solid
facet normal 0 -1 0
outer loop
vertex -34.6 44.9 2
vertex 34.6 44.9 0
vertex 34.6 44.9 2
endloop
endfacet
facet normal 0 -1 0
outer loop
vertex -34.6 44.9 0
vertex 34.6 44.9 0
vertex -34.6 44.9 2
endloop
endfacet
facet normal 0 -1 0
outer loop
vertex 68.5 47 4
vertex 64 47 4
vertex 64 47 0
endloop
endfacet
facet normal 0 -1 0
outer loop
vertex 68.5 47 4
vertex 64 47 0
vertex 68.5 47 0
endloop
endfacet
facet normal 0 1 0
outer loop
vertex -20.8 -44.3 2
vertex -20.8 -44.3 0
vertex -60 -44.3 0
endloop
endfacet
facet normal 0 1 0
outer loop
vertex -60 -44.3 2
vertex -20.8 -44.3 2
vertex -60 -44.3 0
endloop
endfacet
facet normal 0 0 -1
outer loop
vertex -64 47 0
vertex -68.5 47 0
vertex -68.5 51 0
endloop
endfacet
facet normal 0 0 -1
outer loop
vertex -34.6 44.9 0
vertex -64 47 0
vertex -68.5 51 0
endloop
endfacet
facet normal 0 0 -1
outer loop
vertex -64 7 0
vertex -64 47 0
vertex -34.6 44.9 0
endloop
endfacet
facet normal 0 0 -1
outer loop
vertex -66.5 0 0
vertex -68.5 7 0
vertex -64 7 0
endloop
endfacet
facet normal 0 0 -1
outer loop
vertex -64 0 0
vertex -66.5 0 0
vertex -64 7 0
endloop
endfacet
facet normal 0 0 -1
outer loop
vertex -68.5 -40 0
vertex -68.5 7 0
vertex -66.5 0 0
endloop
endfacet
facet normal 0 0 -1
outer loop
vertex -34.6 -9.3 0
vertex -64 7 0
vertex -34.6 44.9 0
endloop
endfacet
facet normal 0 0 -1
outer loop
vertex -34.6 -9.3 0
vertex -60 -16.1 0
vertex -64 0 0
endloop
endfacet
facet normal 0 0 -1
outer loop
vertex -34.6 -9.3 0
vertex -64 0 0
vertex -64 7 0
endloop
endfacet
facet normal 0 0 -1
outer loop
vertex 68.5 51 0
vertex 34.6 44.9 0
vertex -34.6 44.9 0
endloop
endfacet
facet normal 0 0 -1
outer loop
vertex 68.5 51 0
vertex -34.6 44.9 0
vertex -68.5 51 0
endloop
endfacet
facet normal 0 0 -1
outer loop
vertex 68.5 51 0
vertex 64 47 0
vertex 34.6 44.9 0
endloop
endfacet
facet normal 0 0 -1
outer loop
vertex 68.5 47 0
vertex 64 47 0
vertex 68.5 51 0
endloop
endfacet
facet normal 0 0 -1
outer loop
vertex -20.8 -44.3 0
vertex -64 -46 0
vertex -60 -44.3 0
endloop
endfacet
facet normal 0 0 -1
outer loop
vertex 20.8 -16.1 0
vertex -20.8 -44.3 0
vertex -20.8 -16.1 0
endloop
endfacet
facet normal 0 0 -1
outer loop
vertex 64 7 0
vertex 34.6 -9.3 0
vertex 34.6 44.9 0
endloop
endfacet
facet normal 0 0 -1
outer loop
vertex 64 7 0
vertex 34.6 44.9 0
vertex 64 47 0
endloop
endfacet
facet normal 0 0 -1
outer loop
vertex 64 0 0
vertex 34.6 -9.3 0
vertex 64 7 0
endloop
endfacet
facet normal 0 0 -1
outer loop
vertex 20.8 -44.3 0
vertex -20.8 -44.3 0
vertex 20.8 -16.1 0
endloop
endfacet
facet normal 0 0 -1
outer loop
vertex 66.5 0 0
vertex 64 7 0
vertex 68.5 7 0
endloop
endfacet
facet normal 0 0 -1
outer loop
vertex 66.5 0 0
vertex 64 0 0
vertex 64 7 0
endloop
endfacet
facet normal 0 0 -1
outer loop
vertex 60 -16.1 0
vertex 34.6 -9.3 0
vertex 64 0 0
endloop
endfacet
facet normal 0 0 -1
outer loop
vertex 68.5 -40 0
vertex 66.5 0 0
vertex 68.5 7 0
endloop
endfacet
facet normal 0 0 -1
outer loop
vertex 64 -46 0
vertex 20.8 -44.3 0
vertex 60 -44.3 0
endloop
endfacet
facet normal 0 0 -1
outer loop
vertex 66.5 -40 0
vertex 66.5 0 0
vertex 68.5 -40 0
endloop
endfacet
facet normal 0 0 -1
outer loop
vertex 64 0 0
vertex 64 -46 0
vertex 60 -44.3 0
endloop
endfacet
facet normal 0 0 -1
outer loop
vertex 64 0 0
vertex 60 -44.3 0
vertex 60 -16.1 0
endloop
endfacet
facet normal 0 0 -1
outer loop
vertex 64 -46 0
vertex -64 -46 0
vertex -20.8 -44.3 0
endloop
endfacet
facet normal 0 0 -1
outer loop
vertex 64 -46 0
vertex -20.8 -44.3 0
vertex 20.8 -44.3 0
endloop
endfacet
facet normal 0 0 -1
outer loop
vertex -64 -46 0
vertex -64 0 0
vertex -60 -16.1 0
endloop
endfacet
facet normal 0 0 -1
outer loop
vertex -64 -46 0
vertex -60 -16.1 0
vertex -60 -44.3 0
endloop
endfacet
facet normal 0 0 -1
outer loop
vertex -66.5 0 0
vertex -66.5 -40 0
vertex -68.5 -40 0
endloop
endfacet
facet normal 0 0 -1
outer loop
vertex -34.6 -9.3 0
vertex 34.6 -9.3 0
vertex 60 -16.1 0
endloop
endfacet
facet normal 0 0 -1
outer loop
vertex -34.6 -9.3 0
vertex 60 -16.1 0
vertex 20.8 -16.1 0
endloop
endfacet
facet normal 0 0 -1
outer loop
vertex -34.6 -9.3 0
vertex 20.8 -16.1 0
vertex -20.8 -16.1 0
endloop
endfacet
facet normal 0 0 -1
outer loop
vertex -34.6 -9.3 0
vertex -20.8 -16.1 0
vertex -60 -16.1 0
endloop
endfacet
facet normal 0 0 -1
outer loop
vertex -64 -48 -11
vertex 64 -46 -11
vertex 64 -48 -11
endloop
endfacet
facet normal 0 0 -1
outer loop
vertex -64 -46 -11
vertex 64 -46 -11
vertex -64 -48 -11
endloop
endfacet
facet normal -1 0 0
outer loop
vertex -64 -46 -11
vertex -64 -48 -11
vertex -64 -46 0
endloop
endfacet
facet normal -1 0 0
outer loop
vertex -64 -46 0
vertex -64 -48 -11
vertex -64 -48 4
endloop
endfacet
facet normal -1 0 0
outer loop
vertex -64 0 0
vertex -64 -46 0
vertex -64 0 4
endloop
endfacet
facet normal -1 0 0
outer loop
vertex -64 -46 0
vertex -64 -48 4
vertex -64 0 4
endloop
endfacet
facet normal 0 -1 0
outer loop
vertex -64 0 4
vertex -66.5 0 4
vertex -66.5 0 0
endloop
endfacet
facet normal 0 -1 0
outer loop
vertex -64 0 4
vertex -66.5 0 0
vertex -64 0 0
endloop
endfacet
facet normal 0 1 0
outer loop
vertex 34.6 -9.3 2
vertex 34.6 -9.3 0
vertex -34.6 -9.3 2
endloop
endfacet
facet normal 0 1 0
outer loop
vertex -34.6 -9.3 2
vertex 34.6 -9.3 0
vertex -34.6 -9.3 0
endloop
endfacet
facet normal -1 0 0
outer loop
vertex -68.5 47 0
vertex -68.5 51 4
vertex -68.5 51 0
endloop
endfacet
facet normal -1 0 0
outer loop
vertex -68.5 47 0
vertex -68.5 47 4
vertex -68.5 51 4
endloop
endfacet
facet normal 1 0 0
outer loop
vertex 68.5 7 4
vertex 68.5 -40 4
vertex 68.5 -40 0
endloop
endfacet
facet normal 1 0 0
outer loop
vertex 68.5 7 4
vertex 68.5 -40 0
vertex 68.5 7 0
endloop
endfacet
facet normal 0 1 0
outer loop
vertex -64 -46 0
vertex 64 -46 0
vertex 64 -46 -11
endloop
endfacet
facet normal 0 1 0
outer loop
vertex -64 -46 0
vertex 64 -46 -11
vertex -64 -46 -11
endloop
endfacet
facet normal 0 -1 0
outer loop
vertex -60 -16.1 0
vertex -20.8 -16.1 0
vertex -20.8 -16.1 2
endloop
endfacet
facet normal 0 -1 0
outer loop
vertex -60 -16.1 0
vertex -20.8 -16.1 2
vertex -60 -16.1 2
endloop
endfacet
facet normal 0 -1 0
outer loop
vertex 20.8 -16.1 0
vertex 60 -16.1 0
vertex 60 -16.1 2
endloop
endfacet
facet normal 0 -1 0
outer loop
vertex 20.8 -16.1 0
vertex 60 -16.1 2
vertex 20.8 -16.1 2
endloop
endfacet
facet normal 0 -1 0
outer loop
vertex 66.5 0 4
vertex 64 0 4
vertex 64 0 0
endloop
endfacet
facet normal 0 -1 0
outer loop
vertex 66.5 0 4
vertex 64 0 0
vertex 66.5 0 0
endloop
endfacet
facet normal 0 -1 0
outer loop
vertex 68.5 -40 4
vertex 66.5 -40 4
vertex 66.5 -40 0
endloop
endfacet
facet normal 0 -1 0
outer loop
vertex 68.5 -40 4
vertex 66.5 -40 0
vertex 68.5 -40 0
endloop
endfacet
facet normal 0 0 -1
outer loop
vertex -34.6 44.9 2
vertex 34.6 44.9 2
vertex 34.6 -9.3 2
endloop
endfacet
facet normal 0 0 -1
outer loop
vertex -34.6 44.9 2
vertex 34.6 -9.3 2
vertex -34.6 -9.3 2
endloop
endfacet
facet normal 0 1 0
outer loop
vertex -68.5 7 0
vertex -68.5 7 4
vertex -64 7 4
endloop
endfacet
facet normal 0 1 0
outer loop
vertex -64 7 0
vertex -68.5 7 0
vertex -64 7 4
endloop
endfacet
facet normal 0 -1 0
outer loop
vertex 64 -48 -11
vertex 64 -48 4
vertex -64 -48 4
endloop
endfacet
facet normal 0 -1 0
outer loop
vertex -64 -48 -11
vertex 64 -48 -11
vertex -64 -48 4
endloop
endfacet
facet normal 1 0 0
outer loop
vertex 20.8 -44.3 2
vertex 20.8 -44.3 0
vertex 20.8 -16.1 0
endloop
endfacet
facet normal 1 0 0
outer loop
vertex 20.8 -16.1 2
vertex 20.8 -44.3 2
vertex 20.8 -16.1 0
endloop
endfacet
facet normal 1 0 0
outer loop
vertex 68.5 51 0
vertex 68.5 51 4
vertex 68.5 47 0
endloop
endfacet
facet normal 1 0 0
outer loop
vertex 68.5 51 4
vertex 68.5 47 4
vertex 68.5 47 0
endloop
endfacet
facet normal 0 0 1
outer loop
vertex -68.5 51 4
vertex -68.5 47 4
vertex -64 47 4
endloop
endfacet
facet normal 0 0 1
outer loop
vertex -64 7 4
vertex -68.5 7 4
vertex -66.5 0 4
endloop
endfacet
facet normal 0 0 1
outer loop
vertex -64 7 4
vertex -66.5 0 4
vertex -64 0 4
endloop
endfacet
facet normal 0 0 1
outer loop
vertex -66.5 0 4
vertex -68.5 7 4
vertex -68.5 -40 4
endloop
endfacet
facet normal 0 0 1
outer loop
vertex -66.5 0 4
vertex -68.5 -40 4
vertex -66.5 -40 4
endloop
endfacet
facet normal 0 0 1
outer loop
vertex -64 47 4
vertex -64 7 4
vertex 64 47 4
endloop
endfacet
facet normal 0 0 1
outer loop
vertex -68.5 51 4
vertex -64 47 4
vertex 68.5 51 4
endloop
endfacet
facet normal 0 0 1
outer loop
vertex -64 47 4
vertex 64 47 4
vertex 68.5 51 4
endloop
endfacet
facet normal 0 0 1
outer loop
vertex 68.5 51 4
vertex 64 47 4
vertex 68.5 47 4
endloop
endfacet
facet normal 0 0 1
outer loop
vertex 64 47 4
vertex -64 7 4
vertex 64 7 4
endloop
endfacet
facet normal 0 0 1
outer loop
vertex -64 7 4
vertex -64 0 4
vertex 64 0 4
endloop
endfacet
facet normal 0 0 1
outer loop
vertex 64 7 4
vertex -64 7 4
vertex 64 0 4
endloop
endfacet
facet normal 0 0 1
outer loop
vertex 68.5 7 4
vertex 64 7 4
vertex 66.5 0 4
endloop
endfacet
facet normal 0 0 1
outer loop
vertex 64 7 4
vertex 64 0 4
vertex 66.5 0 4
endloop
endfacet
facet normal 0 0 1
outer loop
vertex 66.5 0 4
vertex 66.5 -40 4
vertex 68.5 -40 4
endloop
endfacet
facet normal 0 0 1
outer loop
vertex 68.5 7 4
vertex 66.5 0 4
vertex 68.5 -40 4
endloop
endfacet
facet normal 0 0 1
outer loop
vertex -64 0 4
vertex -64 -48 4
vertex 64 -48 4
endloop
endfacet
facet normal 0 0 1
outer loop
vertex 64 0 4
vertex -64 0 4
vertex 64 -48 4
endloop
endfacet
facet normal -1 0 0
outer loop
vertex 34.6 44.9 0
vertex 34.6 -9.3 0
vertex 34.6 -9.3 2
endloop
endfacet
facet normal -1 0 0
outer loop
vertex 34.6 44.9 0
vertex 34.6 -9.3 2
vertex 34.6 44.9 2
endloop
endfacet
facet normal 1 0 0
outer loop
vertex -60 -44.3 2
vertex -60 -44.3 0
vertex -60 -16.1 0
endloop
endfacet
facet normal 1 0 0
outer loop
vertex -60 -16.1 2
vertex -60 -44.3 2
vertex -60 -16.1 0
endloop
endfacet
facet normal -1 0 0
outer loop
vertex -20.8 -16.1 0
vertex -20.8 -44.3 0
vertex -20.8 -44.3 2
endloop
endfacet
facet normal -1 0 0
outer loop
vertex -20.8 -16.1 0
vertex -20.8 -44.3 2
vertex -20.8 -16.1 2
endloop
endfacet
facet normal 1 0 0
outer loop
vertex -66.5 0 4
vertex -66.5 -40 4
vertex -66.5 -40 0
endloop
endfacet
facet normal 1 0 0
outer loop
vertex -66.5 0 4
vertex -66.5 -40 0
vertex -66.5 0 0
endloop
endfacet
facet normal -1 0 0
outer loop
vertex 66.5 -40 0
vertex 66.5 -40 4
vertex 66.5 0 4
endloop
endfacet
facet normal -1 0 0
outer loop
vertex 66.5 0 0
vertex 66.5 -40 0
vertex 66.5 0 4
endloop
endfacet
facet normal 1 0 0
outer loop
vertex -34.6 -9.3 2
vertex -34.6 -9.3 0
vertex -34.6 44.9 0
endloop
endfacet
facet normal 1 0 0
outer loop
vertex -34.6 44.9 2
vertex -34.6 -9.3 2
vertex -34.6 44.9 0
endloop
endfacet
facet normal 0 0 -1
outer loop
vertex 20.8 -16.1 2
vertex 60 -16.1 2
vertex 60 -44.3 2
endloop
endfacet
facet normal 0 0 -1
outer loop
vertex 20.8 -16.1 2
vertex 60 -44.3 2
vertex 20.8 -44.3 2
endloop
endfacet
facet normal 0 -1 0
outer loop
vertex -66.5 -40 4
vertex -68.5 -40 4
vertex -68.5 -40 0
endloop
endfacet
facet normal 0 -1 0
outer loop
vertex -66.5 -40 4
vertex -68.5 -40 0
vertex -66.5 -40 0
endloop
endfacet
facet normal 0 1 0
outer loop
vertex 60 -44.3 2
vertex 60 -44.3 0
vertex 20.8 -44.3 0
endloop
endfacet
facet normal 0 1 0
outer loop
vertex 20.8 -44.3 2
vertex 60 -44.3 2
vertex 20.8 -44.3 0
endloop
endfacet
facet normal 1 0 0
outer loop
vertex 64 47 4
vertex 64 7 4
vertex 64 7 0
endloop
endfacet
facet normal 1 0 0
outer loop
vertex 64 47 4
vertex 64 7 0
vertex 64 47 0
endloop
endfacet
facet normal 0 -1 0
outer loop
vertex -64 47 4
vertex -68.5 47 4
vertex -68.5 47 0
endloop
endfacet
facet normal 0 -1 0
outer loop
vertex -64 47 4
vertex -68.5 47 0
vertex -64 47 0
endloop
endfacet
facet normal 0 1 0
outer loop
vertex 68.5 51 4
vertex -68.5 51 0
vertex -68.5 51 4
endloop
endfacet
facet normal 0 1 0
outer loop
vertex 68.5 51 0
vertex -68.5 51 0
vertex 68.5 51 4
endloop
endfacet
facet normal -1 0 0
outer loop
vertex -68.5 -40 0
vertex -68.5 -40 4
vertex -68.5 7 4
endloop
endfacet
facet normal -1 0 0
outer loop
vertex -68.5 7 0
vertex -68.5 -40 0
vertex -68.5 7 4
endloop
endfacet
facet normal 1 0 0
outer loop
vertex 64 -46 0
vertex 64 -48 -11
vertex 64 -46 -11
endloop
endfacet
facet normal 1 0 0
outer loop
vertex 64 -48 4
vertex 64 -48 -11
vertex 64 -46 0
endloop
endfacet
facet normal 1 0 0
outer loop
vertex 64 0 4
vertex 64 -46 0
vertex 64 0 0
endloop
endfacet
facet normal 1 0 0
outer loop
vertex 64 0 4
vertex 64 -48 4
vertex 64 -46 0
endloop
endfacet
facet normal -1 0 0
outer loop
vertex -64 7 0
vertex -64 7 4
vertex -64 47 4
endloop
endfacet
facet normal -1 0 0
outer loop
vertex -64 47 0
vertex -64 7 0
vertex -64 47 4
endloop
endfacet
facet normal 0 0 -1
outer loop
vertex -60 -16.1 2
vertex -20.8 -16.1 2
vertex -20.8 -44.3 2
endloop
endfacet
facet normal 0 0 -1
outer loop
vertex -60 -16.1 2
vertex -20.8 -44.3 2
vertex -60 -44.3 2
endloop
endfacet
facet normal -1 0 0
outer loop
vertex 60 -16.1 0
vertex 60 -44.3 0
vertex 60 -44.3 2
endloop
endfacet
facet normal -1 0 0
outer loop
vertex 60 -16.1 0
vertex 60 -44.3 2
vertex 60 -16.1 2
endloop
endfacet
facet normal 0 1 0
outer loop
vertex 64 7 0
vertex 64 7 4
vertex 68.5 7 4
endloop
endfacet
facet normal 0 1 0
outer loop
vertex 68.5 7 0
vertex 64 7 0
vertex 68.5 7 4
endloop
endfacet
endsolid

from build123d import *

# Parameters (mm, degrees)
SKETCH1_W           = 137
SKETCH1_H           = 96
BOSS_EXTRUDE1_DEPTH = 4
SKETCH2_W           = 2.5
SKETCH2_H           = 40
SKETCH2_W_2         = 4.5
CUT_EXTRUDE1_DEPTH  = 4
SKETCH3_W           = 137
SKETCH3_H           = 4
BOSS_EXTRUDE2_DEPTH = 3
SKETCH4_W           = 137
SKETCH4_H           = 2
BOSS_EXTRUDE3_DEPTH = 11
SKETCH5_W           = 4.5
SKETCH5_H           = 8
CUT_EXTRUDE2_DEPTH  = 16
SKETCH6_W           = 39.2
SKETCH6_H           = 28.2
SKETCH6_W_2         = 69.2
SKETCH6_H_2         = 54.2
CUT_EXTRUDE3_DEPTH  = 2


with BuildPart() as part:
    # Sketch1 → Boss-Extrude1 (new body)
    with BuildSketch(Plane.XY):
        Rectangle(SKETCH1_W, SKETCH1_H)
    extrude(amount=BOSS_EXTRUDE1_DEPTH)

    # Sketch2 → Cut-Extrude1 (cut)
    with BuildSketch(Plane.XY.offset(4)):
        with Locations((-65.25, -20)):
            Rectangle(SKETCH2_W, SKETCH2_H)
        with Locations((65.25, -20)):
            Rectangle(SKETCH2_W, SKETCH2_H)
        with Locations((-66.25, 27)):
            Rectangle(SKETCH2_W_2, SKETCH2_H)
        with Locations((66.25, 27)):
            Rectangle(SKETCH2_W_2, SKETCH2_H)
    extrude(amount=-CUT_EXTRUDE1_DEPTH, mode=Mode.SUBTRACT)

    # Sketch3 → Boss-Extrude2 (add)
    with BuildSketch(Plane(origin=(0, 48, 0), x_dir=(1, 0, 0), z_dir=(0, 1, 0))):
        with Locations((0, -2)):
            Rectangle(SKETCH3_W, SKETCH3_H)
    extrude(amount=BOSS_EXTRUDE2_DEPTH)

    # Sketch4 → Boss-Extrude3 (add)
    with BuildSketch(Plane(origin=(0, 0, 0), x_dir=(-1, 0, 0), z_dir=(0, 0, -1))):
        with Locations((0, -47)):
            Rectangle(SKETCH4_W, SKETCH4_H)
    extrude(amount=BOSS_EXTRUDE3_DEPTH)

    # Sketch5 → Cut-Extrude2 (cut, through all)
    with BuildSketch(Plane.XY.offset(4)):
        with Locations((-66.25, -44)):
            Rectangle(SKETCH5_W, SKETCH5_H)
        with Locations((66.25, -44)):
            Rectangle(SKETCH5_W, SKETCH5_H)
    extrude(amount=-CUT_EXTRUDE2_DEPTH, mode=Mode.SUBTRACT)

    # Sketch6 → Cut-Extrude3 (cut)
    with BuildSketch(Plane(origin=(0, 0, 0), x_dir=(-1, 0, 0), z_dir=(0, 0, -1))):
        with Locations((-40.4, -30.2)):
            Rectangle(SKETCH6_W, SKETCH6_H)
        with Locations((40.4, -30.2)):
            Rectangle(SKETCH6_W, SKETCH6_H)
        with Locations((0, 17.8)):
            Rectangle(SKETCH6_W_2, SKETCH6_H_2)
    extrude(amount=-CUT_EXTRUDE3_DEPTH, mode=Mode.SUBTRACT)


solid = part.part
